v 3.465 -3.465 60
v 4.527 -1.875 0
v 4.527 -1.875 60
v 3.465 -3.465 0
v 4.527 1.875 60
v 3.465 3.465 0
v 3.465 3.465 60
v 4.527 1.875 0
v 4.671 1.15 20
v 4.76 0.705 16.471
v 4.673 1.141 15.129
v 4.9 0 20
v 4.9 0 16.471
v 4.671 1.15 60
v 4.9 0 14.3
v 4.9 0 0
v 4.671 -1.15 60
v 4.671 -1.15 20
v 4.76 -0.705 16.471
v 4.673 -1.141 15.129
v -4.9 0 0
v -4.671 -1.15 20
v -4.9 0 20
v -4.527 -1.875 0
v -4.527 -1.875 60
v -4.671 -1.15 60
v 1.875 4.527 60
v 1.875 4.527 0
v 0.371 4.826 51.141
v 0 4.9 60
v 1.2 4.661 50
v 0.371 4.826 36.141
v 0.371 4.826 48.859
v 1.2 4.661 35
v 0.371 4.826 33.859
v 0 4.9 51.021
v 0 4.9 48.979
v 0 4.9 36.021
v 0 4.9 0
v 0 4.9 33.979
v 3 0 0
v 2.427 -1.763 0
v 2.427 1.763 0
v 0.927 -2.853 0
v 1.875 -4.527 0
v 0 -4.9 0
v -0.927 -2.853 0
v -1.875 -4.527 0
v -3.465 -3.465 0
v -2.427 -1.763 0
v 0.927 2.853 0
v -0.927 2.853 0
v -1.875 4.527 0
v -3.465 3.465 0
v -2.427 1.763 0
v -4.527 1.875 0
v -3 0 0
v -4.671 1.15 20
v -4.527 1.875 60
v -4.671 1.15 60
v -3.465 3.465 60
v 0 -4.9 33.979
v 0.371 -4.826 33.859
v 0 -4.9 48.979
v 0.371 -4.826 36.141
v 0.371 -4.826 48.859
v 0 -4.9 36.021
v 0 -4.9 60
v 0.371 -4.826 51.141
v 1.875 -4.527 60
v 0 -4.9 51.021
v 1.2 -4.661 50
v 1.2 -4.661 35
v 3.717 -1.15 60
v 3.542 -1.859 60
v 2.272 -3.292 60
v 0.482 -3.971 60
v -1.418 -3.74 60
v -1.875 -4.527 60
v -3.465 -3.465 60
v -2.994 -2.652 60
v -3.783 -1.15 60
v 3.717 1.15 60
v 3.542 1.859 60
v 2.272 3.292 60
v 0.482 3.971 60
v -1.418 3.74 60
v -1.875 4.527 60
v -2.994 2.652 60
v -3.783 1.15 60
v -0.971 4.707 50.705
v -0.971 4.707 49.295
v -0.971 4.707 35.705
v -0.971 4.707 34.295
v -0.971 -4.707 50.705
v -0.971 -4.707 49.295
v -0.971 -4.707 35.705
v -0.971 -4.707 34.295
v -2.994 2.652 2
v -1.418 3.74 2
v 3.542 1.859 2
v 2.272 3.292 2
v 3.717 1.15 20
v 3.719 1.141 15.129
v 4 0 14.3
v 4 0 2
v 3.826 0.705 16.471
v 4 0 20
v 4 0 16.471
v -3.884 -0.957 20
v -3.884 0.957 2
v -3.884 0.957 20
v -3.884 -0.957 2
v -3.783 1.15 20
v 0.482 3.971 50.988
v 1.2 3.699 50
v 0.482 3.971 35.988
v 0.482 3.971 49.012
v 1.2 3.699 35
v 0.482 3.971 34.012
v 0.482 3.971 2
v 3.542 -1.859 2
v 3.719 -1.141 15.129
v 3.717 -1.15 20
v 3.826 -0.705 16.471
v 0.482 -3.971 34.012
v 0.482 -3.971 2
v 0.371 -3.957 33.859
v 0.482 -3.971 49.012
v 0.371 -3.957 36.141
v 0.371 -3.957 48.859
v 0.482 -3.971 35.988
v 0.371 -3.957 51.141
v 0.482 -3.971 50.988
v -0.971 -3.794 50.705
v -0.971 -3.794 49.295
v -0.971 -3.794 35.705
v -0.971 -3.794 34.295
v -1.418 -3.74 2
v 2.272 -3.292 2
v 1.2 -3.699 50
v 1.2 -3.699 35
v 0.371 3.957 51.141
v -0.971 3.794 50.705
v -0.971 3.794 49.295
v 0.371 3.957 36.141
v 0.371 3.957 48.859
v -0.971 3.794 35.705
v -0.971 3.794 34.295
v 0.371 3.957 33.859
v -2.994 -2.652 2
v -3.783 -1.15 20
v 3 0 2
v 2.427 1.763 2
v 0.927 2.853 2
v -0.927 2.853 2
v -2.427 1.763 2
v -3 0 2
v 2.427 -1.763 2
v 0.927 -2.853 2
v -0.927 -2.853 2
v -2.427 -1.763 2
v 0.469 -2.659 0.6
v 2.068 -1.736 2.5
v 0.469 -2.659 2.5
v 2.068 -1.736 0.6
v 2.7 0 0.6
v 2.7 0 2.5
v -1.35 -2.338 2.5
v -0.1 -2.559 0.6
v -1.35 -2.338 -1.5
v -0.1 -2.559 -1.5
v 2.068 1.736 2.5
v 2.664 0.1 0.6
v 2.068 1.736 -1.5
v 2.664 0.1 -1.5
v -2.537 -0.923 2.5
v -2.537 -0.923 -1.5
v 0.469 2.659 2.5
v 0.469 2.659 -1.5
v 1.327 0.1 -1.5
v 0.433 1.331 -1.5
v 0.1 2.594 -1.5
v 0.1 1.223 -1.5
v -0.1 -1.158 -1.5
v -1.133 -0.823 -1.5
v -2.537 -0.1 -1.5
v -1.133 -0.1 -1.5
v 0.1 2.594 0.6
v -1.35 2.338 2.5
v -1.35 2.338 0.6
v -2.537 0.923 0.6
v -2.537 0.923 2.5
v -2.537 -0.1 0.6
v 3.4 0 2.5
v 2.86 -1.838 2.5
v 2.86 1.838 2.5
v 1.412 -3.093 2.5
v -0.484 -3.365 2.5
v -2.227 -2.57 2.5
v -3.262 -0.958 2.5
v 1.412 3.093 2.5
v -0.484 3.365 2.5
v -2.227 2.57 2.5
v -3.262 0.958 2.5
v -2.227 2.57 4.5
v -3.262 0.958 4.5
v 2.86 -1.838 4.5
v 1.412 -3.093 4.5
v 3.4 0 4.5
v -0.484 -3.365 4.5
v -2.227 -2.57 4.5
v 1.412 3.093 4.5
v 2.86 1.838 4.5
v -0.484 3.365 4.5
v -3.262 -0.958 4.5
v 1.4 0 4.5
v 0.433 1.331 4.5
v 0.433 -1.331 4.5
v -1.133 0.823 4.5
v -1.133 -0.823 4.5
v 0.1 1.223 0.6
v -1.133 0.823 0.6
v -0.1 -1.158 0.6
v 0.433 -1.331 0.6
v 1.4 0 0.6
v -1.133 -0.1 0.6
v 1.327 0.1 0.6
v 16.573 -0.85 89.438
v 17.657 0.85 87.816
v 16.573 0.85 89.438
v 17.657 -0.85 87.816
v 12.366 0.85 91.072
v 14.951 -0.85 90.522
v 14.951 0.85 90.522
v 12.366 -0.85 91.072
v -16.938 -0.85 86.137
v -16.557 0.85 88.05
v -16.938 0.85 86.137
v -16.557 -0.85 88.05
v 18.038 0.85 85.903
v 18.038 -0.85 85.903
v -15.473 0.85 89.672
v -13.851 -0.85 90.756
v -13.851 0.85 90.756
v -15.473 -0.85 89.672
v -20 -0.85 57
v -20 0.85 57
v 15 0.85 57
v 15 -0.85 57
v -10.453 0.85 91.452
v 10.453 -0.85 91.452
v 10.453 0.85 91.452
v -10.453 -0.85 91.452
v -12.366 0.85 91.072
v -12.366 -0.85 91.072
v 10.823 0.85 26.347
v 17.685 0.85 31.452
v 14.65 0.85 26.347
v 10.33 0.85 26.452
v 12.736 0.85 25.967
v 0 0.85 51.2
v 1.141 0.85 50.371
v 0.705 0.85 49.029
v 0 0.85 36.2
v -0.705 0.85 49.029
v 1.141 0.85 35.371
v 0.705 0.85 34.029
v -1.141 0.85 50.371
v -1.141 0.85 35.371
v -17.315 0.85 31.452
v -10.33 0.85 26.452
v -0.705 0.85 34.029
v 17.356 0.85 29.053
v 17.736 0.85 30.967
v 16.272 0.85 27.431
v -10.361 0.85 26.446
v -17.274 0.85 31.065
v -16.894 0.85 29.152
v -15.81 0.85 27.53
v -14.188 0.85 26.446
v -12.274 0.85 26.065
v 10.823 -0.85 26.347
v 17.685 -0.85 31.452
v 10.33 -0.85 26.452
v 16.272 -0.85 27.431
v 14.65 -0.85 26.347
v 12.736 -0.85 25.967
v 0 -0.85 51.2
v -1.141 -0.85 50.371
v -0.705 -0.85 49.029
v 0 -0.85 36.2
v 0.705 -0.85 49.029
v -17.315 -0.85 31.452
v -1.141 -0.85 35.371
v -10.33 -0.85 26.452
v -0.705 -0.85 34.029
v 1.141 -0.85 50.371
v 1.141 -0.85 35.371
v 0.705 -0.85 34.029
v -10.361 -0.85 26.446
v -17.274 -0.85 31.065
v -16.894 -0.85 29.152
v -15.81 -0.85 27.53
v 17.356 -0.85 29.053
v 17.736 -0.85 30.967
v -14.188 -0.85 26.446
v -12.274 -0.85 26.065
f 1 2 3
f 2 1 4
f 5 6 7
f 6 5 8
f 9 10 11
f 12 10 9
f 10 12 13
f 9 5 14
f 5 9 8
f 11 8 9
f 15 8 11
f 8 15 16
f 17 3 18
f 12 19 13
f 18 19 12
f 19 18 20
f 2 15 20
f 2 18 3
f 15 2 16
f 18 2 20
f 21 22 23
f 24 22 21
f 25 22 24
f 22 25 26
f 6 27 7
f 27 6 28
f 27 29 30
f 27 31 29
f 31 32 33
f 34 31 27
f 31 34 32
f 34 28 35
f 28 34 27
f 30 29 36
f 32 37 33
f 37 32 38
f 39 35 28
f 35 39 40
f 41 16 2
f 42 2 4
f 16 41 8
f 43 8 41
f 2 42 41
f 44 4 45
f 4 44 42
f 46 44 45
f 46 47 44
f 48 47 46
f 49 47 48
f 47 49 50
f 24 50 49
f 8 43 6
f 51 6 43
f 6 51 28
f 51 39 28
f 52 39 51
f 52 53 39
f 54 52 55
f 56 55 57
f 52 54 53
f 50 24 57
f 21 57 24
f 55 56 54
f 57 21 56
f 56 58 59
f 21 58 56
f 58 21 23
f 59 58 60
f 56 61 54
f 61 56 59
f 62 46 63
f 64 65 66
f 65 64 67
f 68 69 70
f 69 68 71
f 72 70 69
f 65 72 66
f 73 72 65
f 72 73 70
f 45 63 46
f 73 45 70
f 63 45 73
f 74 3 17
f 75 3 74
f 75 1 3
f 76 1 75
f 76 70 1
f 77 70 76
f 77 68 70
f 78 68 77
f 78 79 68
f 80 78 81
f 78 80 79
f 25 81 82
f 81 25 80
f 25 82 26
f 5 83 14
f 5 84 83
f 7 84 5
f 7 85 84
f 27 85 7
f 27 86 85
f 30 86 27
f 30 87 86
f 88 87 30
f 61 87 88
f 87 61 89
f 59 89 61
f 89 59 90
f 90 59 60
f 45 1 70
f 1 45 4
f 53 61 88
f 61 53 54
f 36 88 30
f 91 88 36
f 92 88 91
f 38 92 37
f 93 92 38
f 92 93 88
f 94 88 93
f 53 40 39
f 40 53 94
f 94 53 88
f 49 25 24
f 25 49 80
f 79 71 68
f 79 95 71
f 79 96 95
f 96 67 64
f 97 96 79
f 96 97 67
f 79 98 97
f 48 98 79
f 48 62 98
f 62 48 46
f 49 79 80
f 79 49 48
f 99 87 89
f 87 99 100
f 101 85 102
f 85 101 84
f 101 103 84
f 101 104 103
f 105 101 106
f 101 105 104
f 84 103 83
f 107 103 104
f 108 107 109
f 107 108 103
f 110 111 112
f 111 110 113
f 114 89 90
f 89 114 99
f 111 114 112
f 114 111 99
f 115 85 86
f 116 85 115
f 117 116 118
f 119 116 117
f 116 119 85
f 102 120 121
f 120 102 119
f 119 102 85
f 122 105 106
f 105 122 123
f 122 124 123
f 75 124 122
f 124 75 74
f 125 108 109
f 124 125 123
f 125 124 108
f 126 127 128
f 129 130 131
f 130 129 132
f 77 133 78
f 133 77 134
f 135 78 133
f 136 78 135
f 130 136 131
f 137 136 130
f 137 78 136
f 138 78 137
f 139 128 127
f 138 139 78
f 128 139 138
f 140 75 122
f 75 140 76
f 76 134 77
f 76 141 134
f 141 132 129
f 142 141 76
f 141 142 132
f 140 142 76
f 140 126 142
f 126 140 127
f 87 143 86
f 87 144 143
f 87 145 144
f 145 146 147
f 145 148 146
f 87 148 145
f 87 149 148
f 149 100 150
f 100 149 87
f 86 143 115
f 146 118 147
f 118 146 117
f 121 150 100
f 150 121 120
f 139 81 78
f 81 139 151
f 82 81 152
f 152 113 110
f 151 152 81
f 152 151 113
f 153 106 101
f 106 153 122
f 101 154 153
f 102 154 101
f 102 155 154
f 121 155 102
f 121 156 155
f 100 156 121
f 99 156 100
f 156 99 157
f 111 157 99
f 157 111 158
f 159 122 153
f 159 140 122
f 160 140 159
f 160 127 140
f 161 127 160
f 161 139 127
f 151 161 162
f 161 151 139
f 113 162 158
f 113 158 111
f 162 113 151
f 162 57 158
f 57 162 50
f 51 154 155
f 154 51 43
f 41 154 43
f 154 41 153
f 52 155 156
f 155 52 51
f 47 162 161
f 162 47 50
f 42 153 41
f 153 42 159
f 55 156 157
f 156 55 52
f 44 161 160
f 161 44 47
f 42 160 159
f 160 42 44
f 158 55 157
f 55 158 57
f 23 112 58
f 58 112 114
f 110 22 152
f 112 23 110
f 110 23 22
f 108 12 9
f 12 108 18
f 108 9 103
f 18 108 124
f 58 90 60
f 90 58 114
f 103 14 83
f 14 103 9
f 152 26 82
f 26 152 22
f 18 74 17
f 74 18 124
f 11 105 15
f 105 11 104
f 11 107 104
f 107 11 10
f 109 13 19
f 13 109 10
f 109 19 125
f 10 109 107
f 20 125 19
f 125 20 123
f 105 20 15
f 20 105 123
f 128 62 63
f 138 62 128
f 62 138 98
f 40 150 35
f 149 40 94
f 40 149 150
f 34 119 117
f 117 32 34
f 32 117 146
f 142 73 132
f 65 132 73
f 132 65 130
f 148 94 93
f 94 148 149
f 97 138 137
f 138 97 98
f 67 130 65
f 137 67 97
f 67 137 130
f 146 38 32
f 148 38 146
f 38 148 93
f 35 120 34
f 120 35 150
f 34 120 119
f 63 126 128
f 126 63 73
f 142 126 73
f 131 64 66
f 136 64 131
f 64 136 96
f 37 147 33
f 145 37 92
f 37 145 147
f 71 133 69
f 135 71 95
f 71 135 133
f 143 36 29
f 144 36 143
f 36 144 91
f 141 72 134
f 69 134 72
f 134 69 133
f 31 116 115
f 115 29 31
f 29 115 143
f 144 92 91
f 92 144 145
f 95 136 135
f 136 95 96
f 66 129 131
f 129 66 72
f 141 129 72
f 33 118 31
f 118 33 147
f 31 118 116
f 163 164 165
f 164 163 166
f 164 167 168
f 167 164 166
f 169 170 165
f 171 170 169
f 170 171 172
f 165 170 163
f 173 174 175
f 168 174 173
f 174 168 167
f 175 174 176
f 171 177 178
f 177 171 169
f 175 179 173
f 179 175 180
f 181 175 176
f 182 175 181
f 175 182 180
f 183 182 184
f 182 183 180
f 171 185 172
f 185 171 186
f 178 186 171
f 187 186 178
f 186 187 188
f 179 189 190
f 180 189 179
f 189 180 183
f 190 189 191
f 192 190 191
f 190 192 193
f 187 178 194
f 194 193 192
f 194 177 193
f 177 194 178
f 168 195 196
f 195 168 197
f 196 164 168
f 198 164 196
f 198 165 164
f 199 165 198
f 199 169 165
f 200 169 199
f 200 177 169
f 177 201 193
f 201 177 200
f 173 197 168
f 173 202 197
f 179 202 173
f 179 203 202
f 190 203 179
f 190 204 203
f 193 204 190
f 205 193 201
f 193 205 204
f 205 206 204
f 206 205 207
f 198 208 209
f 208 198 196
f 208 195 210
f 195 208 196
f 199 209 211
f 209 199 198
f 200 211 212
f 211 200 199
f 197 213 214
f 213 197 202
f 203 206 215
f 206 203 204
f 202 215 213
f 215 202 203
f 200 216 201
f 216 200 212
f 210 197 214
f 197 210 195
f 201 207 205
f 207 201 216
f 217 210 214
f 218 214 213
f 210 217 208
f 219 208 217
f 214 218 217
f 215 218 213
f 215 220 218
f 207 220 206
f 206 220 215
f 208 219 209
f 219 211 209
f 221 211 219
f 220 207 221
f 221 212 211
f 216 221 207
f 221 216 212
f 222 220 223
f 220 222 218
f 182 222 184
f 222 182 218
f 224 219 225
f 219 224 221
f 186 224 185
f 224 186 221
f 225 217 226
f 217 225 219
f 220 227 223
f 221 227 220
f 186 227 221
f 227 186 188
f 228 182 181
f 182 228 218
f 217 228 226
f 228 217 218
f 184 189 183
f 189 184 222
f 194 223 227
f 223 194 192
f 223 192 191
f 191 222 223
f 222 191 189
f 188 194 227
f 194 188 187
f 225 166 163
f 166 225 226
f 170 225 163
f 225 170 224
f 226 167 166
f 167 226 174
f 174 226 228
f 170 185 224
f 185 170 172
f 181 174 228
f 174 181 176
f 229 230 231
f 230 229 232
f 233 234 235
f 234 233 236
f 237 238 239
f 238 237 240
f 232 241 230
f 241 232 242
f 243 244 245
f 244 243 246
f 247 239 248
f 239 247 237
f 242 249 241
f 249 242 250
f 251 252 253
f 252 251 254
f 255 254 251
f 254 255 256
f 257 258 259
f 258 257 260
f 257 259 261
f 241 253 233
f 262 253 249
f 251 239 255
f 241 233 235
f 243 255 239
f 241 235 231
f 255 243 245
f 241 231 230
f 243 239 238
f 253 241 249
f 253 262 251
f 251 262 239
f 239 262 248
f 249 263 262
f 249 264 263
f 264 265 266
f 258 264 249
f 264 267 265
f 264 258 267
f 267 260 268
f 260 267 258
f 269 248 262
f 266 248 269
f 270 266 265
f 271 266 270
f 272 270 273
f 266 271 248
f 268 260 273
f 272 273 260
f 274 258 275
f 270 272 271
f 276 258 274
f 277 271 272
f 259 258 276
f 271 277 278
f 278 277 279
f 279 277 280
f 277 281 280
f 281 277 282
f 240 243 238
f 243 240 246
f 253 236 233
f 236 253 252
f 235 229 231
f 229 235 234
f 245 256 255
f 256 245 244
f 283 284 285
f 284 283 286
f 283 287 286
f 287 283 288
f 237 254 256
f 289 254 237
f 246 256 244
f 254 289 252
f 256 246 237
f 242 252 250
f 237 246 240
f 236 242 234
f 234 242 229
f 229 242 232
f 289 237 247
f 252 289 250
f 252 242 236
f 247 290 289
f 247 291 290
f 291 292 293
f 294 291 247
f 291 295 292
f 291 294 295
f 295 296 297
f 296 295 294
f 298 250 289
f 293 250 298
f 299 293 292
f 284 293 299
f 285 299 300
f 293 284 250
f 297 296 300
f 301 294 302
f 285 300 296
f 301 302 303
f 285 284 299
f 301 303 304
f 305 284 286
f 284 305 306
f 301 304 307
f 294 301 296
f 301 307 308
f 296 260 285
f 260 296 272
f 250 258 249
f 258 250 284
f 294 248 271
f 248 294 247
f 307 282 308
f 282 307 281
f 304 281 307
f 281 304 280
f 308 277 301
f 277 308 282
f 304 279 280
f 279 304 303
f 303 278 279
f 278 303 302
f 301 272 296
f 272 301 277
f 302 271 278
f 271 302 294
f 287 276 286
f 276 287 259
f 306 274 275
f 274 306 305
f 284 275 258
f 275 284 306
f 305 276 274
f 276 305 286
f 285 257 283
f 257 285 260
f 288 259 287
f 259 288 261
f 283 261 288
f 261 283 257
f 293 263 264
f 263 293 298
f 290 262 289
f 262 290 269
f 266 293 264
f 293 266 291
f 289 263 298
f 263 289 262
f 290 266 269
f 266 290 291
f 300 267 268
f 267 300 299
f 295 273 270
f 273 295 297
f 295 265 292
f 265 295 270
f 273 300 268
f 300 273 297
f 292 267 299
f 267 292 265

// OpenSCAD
// file: arm_holder.scad
module arm_holder(external_radius, internal_radius, width, tolerence)
{
    union()
    {
        scale(v = [1, 1, 2]) union() {
            difference() {
                cube(size = [external_radius, external_radius, width]);
                translate(v = [0, 0, width/2]) cylinder(h = width*2, r = external_radius, center = true);
            }
            translate(v = [0, external_radius*2, 0]) mirror(v = [0, 1, 0])  difference() {
                cube(size = [external_radius, external_radius, width]);
                translate(v = [0, 0, width/2]) cylinder(h = width*2, r = external_radius, center = true);
            }
        }

        difference()
        {
            translate(v = [0, 0, width/2]) cylinder(h = width, r = external_radius, center = true);
            cylinder(h = 13, r = internal_radius, center = true);
        }
    }
}


rotate(a = 90, v = [0, 1, 0]) arm_holder(5, 3, 4, .1);
// file: blade.scad
module blade()
{
    difference()
    {
        minkowski()
        {
            difference()
            {

                cube(size = [ 30, 60, 1.5 ], center = true);
                translate(v = [ 210, 0, -3 ]) cylinder(h = 6, r = 200);
                translate(v = [ -25, 0, 0 ]) scale([ 1, 1, 2 ]) difference()
                {
                    cube(size = [ 30, 60, 1.5 ], center = true);
                    translate(v = [ 210, 0, -3 ]) cylinder(h = 6, r = 200);
                }
                translate(v = [ 0, -125, -3 ]) cylinder(h = 6, r = 100);
                translate(v = [ 0, 55, 0 ]) scale([ 1, 1, 2 ]) difference()
                {
                    cube(size = [ 30, 60, 1.5 ], center = true);
                    translate(v = [ 0, -125, -3 ]) cylinder(h = 6, r = 100);
                }
            }
            translate(v = [ 0, 0, -.1 ]) cylinder(h = 0.2, r = 5);
        }

        translate(v = [ 0, -7, 0 ]) rotate([ 0, 0, 90 ]) cylinder(h = 20, r = 1.2, center = true);
        translate(v = [ 0, -22, 0 ]) rotate([ 0, 0, 90 ]) cylinder(h = 20, r = 1.2, center = true);
    }
}

blade();
// file: arm_pins.scad
use <arm_holder.scad>

module arm_pin(height, radius, hat_radius)
{
    difference()
    {
        union()
        {
            cylinder(h = height, r = radius, center = true);
            translate(v = [ 0, 0, -height / 2 - 1 ]) cylinder(h = 2, r = hat_radius, center = true);
        }
        cylinder(h = 20, r = 1.4, center = true);
        translate(v = [ -2, -2, 2 ]) cube(size = 4.2, center = true);
        translate(v = [ 2, 2, 2 ]) cube(size = 4.2, center = true);
    }
}

arm_pin(3.5, 2.7, 3.7);
// main file
use <arm_pins.scad>
use <blade.scad>

module blade_holder(blade_size, blade_width)
{
    difference()
    {
        cylinder(h = 60, r = 4.9);
        translate(v = [ 0, 0, 2 ]) cylinder(h = 60, r = 4);
        translate(v = [ 0, 0, -2 ]) cylinder(h = 10, r = 3);
        translate(v = [ 0, 0, 55 ]) cube(size = [ blade_size, blade_width, blade_size ], center = true);
        translate(v = [ 0, 0, 15.5 ]) rotate(a = 90, v = [ 0, 1, 0 ]) cylinder(h = 6, r = 1.2);
        translate(v = [ 0, 0, 35 ]) rotate(90, [ 1, 0, 0 ]) cylinder(h = 20, r = 1.2, center = true);
        translate(v = [ 0, 0, 50 ]) rotate(90, [ 1, 0, 0 ]) cylinder(h = 20, r = 1.2, center = true);
    }
}

module blade_holder_strengthener(height, blade_size)
{
    difference()
    {
        cylinder(h = height, r = 3.5);
        translate(v = [ -(height + 2) / 2, -(blade_size / 2), -1 ]) cube(size = [ height + 2, height + 2, height + 2 ]);
    }
}

difference()
{
    union()
    {
        blade_holder(70, 2.3);

        *translate(v = [ 0, 0, 30 ]) //
            blade_holder_strengthener(50, 2.5);

        translate(v = [ 0, 0, 0 ])           //
            translate(v = [ 0, 0, .5 ])      //
            rotate(a = 180, v = [ 1, 0, 0 ]) //
            arm_pin(4, 2.7, 3.4);

        translate(v = [ 0, 0, 57 ]) rotate(a = 90, v = [ 1, 0, 0 ]) blade();
    }
    *translate(v = [ -100, 0, 40 ]) cube(size = [ 200, 200, 200 ], center = true);
}
